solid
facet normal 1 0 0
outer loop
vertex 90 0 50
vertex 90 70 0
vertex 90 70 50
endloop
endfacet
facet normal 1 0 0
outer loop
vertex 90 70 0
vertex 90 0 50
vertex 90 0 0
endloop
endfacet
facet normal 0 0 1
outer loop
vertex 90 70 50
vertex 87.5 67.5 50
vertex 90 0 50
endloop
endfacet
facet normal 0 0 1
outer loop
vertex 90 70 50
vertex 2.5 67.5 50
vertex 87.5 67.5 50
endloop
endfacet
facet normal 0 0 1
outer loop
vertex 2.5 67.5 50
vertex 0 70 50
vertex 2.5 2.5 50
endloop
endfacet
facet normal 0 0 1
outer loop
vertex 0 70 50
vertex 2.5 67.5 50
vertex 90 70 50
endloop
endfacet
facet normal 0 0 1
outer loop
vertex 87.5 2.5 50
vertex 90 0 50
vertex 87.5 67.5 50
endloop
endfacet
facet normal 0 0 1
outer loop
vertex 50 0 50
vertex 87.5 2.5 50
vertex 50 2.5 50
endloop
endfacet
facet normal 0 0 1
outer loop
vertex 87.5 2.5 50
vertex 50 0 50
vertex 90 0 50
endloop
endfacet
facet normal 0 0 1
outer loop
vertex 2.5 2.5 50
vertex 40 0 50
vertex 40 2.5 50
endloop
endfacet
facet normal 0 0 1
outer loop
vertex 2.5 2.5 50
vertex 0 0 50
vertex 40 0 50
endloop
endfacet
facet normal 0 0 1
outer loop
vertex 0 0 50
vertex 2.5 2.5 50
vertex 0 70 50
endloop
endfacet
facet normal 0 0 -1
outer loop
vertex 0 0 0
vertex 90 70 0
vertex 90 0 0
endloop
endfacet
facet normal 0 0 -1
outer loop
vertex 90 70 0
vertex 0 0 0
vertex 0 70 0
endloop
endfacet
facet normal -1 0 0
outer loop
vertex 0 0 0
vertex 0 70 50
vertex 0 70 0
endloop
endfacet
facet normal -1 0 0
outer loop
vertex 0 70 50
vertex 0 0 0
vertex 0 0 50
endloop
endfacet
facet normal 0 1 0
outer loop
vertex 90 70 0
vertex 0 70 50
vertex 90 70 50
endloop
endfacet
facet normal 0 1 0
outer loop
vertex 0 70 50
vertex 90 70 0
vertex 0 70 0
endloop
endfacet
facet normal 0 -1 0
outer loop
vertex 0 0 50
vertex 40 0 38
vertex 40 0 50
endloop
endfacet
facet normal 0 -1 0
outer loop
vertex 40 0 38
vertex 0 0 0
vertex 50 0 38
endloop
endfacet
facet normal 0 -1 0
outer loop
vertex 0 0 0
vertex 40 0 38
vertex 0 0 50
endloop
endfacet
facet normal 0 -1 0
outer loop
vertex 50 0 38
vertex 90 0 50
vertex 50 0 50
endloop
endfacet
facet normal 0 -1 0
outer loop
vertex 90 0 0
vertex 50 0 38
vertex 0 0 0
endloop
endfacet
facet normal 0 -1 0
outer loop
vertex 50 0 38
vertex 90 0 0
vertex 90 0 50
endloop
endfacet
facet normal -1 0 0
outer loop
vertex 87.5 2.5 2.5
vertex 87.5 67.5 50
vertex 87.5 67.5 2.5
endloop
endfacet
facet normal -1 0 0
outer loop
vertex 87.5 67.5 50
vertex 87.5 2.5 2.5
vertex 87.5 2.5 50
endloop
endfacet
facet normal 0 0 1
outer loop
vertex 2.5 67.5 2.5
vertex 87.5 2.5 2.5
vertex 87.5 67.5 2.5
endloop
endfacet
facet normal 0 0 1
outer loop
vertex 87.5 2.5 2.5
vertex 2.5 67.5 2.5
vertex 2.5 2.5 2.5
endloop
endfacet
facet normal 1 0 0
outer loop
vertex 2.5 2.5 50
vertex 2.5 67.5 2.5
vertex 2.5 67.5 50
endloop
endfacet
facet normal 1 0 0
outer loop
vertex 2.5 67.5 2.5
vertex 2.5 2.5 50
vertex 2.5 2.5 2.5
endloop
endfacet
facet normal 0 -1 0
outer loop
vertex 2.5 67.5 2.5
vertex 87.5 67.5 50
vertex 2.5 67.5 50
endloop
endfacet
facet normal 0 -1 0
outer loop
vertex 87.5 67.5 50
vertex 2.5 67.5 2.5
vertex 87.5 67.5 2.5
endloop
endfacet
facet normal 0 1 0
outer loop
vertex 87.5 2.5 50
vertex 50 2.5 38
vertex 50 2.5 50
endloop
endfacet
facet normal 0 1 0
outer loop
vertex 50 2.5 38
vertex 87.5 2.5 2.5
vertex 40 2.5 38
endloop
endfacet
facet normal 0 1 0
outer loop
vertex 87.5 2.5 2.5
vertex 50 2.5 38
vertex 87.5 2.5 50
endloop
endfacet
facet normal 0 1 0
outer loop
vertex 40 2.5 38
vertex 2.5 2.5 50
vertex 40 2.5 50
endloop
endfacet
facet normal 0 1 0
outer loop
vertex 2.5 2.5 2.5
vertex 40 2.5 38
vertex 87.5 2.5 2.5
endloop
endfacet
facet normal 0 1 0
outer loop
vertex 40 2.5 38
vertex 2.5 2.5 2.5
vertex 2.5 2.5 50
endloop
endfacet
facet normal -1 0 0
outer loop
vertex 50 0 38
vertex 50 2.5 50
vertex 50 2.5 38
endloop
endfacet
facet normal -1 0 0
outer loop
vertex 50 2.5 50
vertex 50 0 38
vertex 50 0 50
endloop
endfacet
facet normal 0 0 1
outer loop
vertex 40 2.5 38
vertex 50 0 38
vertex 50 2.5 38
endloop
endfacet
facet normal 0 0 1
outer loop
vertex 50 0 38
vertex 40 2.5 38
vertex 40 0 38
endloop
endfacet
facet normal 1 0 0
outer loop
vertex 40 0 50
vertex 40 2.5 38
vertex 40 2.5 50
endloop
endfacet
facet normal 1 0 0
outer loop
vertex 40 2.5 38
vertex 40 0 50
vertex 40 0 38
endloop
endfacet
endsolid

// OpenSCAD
$fn = 32;

// ----------------------------------------------------------------------
// Enclosure box: notch enclosure
// ----------------------------------------------------------------------

// --- parameters (mm) ---
box_l = 90;               // outer length, X
box_w = 70;               // outer width, Y
box_h = 50;               // outer height
wall_t = 2.5;             // wall thickness
notch_w = 10;             // cable notch width
notch_h = 12;             // cable notch height
fit_tol = 0.1;            // tolerance for press fits, mm
free_tol = 0.3;           // tolerance for clearance fits, mm

inner_h = box_h - wall_t;  // cavity depth
boss_h = inner_h - 2;  // corner boss height

difference() {
  cube([box_l, box_w, box_h]);
  translate([wall_t, wall_t, wall_t])
    cube([box_l - 2 * wall_t, box_w - 2 * wall_t, box_h]);
  translate([box_l / 2 - notch_w / 2, -1, box_h - notch_h])
    cube([notch_w, wall_t + 2, notch_h + 1]);
}
